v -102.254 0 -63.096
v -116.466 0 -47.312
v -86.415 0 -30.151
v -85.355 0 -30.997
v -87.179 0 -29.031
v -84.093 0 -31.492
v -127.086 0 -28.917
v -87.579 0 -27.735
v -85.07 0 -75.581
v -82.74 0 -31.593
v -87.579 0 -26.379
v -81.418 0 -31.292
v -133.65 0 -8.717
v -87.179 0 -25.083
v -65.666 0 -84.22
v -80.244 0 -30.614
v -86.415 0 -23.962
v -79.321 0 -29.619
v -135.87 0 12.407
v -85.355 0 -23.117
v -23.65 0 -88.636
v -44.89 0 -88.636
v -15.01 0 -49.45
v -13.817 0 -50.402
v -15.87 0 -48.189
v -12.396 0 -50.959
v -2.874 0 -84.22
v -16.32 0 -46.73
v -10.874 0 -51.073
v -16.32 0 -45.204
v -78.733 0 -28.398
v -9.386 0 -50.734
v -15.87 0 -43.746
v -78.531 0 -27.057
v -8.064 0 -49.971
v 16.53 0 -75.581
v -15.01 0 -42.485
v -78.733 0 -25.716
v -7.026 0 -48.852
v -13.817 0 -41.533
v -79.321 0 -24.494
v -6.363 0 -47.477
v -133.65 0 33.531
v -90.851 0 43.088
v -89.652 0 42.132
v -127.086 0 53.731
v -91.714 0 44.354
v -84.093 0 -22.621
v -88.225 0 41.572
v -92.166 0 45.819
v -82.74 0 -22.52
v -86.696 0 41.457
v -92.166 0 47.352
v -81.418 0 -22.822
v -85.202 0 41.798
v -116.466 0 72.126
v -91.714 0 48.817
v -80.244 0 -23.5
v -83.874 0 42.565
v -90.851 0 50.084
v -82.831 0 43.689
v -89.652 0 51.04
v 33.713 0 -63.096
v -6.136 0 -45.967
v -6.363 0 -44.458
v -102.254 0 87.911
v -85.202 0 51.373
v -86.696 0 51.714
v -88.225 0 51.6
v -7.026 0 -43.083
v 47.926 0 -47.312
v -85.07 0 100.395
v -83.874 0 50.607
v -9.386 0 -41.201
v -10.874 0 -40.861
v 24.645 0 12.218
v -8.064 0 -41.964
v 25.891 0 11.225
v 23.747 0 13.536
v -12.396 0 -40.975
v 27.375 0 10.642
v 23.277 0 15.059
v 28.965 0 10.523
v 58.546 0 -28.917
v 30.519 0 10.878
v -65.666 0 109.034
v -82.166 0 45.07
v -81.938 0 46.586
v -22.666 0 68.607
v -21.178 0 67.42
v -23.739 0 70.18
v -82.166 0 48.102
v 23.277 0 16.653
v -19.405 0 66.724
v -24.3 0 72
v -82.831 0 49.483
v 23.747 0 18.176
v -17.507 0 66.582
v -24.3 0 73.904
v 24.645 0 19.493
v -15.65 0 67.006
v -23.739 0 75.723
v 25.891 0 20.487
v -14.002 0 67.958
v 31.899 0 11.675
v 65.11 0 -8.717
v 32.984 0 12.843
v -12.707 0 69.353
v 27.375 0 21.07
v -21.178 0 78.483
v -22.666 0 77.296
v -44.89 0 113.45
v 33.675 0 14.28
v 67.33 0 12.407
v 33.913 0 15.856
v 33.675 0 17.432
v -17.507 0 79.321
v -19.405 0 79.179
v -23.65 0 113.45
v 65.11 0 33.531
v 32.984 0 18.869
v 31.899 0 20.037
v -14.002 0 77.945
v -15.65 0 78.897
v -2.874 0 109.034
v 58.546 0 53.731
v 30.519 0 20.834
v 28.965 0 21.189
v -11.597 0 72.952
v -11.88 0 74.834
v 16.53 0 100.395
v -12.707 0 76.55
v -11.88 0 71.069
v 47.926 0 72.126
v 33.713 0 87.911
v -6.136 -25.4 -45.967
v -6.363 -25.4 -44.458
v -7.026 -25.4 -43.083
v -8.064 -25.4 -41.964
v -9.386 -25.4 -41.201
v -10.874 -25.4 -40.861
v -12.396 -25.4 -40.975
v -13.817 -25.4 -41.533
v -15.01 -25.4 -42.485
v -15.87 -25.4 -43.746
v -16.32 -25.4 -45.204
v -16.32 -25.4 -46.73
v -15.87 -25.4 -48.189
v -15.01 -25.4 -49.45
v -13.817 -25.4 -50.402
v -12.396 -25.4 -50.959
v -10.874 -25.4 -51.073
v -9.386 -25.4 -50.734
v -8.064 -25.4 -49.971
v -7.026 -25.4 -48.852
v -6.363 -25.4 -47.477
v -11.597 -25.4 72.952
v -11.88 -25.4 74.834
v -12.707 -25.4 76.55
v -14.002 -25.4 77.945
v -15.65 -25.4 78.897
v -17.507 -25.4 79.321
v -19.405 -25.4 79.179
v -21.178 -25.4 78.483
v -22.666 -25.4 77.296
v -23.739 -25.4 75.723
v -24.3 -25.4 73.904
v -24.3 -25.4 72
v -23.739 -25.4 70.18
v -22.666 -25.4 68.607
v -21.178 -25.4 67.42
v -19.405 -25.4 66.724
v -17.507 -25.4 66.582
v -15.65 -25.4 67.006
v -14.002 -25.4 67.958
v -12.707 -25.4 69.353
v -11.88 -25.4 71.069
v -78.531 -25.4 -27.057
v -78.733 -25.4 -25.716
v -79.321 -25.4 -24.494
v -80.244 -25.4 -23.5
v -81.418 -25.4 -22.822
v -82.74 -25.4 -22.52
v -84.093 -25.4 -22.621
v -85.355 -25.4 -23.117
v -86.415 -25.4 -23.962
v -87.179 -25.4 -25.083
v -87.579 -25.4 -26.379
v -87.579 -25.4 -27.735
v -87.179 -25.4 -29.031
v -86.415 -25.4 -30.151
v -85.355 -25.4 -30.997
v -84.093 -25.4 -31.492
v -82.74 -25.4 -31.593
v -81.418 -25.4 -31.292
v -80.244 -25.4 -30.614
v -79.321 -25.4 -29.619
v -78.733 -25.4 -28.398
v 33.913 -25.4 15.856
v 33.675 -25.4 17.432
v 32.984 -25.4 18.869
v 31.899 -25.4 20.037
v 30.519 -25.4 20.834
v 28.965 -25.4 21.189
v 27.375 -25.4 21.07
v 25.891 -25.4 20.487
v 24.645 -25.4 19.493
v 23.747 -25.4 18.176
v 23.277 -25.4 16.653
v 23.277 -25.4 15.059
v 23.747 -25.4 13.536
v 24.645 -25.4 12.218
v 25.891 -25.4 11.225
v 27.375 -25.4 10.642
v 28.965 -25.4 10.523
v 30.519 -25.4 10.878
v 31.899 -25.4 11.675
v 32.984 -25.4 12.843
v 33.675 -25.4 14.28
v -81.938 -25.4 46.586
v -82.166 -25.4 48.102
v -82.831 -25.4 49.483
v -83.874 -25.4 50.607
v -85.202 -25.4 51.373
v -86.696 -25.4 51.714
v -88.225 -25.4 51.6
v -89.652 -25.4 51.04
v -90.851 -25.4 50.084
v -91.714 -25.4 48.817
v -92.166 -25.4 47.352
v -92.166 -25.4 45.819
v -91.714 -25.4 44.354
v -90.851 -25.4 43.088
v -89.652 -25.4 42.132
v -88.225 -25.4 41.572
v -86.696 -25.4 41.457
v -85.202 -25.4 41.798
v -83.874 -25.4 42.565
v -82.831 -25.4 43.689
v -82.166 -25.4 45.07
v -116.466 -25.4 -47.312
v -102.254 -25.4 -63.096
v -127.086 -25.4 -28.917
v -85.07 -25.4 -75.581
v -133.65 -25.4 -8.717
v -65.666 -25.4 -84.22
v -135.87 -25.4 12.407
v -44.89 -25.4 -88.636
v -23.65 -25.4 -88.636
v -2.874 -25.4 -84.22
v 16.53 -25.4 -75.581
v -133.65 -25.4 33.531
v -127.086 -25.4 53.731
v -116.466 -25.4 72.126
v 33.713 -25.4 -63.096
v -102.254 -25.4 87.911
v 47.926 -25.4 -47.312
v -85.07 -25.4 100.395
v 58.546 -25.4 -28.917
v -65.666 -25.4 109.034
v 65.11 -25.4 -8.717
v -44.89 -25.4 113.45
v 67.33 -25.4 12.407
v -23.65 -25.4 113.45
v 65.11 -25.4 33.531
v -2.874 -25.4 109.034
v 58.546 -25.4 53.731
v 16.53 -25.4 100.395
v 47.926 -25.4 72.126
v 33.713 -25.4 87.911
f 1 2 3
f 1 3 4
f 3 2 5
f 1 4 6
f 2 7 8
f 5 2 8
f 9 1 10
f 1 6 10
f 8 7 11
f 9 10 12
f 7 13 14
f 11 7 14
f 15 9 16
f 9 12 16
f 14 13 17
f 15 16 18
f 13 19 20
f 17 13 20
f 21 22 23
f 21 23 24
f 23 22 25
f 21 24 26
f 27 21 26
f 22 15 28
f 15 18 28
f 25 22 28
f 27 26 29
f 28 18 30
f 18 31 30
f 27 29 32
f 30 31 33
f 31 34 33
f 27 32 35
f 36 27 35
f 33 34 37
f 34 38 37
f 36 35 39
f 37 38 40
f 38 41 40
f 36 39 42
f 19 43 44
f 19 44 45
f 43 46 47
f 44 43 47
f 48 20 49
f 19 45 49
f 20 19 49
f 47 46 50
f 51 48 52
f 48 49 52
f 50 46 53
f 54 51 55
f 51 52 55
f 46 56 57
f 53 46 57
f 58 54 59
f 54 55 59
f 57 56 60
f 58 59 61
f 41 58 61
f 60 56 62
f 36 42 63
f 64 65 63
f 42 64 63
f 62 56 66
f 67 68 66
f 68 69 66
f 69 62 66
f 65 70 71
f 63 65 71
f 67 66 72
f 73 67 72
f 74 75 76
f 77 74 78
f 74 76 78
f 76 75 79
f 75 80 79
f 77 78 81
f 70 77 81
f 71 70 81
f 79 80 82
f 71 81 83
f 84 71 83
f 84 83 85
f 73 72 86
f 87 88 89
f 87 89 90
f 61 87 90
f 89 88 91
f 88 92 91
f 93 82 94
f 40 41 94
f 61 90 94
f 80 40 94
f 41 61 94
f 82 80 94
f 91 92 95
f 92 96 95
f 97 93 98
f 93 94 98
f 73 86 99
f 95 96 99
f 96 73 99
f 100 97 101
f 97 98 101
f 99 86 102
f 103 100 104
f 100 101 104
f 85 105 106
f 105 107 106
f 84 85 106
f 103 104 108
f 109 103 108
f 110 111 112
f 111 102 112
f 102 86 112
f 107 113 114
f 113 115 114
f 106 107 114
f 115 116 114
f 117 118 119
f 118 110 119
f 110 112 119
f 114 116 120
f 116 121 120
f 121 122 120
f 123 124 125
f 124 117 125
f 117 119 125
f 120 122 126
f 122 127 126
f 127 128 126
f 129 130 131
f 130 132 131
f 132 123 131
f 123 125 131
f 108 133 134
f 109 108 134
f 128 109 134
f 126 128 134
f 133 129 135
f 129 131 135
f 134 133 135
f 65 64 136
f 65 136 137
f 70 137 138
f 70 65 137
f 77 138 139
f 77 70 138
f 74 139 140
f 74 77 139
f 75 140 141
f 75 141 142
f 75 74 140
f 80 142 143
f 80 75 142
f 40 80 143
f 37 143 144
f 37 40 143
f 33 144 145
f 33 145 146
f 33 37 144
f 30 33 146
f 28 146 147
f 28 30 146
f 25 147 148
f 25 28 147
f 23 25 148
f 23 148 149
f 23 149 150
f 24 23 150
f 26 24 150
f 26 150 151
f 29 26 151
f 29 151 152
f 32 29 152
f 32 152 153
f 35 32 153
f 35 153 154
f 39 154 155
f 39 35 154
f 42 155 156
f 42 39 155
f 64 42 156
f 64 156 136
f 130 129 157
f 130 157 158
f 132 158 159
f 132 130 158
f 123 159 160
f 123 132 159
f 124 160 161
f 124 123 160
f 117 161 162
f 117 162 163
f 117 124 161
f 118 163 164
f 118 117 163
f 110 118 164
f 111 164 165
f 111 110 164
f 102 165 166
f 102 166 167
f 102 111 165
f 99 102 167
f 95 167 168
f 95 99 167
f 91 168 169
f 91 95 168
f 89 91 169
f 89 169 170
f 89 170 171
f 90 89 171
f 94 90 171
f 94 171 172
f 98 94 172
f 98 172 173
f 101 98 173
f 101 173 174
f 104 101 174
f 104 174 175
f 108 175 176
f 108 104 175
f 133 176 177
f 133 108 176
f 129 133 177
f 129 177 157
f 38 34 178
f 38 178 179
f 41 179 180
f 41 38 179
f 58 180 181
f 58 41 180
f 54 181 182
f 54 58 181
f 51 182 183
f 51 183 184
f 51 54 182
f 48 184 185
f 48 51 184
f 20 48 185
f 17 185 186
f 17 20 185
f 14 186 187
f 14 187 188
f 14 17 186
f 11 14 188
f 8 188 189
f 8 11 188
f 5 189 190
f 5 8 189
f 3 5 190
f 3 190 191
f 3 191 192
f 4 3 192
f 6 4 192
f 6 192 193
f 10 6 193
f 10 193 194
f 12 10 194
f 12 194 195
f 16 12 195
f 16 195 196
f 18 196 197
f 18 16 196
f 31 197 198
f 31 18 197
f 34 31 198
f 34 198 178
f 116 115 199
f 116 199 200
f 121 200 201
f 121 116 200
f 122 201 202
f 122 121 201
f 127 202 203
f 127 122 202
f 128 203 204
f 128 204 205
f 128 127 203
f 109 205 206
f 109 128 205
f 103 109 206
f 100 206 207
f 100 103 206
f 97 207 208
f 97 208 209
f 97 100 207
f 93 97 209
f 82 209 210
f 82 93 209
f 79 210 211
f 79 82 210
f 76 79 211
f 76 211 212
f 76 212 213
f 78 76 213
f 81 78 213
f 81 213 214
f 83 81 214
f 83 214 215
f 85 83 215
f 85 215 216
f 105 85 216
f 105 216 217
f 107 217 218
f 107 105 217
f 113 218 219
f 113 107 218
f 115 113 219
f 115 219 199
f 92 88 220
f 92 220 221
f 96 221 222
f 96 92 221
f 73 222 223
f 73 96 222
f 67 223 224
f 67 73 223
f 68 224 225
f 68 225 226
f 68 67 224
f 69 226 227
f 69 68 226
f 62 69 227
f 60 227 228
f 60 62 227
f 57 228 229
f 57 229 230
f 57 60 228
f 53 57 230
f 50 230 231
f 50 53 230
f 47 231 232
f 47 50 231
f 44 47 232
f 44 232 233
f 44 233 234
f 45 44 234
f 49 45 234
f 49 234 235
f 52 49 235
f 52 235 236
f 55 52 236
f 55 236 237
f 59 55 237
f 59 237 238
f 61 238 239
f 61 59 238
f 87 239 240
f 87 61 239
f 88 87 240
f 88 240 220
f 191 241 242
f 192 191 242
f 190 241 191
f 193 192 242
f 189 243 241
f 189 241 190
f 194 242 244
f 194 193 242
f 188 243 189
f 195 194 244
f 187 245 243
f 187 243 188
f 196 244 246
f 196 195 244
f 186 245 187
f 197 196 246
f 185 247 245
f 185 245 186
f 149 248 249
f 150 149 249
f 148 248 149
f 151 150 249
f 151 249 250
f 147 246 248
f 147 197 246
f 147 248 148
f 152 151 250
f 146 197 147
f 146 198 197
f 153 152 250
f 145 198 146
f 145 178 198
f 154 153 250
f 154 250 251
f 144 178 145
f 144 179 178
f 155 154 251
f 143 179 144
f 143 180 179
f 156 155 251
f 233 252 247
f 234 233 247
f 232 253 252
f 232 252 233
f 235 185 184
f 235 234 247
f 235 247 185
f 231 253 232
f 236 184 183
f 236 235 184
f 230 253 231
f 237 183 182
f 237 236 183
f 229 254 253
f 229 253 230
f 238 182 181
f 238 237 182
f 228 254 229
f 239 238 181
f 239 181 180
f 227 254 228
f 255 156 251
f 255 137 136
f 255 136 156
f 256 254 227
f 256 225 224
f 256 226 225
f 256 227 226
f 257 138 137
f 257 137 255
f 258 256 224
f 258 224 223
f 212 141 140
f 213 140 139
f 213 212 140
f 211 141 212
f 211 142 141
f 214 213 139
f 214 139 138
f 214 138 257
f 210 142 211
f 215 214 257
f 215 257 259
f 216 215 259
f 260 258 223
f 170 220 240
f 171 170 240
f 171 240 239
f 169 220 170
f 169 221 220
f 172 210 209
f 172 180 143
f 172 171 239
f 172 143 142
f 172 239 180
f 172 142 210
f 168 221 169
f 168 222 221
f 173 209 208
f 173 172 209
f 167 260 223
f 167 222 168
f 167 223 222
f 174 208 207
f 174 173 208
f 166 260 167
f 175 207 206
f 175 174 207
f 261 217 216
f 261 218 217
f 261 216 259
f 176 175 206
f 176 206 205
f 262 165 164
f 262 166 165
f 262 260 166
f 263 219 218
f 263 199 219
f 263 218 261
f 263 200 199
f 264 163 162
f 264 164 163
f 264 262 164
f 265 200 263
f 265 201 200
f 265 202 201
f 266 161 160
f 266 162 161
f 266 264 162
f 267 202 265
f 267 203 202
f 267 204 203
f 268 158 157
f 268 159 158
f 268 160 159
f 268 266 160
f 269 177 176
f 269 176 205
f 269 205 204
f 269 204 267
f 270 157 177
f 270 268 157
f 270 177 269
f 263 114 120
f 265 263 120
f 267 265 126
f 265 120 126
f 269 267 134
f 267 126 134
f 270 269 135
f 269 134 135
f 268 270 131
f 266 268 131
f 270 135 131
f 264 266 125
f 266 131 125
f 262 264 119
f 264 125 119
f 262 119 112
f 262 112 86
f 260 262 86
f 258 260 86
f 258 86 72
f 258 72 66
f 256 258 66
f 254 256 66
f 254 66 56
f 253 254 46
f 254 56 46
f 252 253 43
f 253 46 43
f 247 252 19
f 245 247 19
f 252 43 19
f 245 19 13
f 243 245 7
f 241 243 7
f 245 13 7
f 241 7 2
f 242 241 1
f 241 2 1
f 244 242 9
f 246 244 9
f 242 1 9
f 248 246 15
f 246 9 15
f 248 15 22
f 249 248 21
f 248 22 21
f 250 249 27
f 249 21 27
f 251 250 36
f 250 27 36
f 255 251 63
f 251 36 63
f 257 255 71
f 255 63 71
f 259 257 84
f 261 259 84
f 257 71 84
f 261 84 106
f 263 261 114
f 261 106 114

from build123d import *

# Parameters (mm, degrees)
F1_R     = 101.6
F1_R_2   = 4.5494653294
F1_R_3   = 5.1204654318
F1_R_4   = 5.1430144974
F1_R_5   = 5.3478696025
F1_R_6   = 6.3874946109
F3_DEPTH = 25.4


# Not quite as in the source:
# - the program builds the solid bodies; features that only make, move or delete a surface that nothing else refers to are left out


with BuildPart() as f3:
    # F1 (on face) → F3 (new body)
    with BuildSketch(Plane.XZ):
        with Locations((-34.2702679336, 12.4070197344)):
            Circle(F1_R)
        with Locations((-83.0803439021, -27.0566623658)):
            Circle(F1_R_2, mode=Mode.SUBTRACT)
        with Locations((-11.2562878057, -45.9673032165)):
            Circle(F1_R_3, mode=Mode.SUBTRACT)
        with Locations((-87.0806723833, 46.585727483)):
            Circle(F1_R_4, mode=Mode.SUBTRACT)
        with Locations((28.565146029, 15.8559419215)):
            Circle(F1_R_5, mode=Mode.SUBTRACT)
        with Locations((-17.984110862, 72.9515254498)):
            Circle(F1_R_6, mode=Mode.SUBTRACT)
    extrude(amount=F3_DEPTH)


solid = f3.part
